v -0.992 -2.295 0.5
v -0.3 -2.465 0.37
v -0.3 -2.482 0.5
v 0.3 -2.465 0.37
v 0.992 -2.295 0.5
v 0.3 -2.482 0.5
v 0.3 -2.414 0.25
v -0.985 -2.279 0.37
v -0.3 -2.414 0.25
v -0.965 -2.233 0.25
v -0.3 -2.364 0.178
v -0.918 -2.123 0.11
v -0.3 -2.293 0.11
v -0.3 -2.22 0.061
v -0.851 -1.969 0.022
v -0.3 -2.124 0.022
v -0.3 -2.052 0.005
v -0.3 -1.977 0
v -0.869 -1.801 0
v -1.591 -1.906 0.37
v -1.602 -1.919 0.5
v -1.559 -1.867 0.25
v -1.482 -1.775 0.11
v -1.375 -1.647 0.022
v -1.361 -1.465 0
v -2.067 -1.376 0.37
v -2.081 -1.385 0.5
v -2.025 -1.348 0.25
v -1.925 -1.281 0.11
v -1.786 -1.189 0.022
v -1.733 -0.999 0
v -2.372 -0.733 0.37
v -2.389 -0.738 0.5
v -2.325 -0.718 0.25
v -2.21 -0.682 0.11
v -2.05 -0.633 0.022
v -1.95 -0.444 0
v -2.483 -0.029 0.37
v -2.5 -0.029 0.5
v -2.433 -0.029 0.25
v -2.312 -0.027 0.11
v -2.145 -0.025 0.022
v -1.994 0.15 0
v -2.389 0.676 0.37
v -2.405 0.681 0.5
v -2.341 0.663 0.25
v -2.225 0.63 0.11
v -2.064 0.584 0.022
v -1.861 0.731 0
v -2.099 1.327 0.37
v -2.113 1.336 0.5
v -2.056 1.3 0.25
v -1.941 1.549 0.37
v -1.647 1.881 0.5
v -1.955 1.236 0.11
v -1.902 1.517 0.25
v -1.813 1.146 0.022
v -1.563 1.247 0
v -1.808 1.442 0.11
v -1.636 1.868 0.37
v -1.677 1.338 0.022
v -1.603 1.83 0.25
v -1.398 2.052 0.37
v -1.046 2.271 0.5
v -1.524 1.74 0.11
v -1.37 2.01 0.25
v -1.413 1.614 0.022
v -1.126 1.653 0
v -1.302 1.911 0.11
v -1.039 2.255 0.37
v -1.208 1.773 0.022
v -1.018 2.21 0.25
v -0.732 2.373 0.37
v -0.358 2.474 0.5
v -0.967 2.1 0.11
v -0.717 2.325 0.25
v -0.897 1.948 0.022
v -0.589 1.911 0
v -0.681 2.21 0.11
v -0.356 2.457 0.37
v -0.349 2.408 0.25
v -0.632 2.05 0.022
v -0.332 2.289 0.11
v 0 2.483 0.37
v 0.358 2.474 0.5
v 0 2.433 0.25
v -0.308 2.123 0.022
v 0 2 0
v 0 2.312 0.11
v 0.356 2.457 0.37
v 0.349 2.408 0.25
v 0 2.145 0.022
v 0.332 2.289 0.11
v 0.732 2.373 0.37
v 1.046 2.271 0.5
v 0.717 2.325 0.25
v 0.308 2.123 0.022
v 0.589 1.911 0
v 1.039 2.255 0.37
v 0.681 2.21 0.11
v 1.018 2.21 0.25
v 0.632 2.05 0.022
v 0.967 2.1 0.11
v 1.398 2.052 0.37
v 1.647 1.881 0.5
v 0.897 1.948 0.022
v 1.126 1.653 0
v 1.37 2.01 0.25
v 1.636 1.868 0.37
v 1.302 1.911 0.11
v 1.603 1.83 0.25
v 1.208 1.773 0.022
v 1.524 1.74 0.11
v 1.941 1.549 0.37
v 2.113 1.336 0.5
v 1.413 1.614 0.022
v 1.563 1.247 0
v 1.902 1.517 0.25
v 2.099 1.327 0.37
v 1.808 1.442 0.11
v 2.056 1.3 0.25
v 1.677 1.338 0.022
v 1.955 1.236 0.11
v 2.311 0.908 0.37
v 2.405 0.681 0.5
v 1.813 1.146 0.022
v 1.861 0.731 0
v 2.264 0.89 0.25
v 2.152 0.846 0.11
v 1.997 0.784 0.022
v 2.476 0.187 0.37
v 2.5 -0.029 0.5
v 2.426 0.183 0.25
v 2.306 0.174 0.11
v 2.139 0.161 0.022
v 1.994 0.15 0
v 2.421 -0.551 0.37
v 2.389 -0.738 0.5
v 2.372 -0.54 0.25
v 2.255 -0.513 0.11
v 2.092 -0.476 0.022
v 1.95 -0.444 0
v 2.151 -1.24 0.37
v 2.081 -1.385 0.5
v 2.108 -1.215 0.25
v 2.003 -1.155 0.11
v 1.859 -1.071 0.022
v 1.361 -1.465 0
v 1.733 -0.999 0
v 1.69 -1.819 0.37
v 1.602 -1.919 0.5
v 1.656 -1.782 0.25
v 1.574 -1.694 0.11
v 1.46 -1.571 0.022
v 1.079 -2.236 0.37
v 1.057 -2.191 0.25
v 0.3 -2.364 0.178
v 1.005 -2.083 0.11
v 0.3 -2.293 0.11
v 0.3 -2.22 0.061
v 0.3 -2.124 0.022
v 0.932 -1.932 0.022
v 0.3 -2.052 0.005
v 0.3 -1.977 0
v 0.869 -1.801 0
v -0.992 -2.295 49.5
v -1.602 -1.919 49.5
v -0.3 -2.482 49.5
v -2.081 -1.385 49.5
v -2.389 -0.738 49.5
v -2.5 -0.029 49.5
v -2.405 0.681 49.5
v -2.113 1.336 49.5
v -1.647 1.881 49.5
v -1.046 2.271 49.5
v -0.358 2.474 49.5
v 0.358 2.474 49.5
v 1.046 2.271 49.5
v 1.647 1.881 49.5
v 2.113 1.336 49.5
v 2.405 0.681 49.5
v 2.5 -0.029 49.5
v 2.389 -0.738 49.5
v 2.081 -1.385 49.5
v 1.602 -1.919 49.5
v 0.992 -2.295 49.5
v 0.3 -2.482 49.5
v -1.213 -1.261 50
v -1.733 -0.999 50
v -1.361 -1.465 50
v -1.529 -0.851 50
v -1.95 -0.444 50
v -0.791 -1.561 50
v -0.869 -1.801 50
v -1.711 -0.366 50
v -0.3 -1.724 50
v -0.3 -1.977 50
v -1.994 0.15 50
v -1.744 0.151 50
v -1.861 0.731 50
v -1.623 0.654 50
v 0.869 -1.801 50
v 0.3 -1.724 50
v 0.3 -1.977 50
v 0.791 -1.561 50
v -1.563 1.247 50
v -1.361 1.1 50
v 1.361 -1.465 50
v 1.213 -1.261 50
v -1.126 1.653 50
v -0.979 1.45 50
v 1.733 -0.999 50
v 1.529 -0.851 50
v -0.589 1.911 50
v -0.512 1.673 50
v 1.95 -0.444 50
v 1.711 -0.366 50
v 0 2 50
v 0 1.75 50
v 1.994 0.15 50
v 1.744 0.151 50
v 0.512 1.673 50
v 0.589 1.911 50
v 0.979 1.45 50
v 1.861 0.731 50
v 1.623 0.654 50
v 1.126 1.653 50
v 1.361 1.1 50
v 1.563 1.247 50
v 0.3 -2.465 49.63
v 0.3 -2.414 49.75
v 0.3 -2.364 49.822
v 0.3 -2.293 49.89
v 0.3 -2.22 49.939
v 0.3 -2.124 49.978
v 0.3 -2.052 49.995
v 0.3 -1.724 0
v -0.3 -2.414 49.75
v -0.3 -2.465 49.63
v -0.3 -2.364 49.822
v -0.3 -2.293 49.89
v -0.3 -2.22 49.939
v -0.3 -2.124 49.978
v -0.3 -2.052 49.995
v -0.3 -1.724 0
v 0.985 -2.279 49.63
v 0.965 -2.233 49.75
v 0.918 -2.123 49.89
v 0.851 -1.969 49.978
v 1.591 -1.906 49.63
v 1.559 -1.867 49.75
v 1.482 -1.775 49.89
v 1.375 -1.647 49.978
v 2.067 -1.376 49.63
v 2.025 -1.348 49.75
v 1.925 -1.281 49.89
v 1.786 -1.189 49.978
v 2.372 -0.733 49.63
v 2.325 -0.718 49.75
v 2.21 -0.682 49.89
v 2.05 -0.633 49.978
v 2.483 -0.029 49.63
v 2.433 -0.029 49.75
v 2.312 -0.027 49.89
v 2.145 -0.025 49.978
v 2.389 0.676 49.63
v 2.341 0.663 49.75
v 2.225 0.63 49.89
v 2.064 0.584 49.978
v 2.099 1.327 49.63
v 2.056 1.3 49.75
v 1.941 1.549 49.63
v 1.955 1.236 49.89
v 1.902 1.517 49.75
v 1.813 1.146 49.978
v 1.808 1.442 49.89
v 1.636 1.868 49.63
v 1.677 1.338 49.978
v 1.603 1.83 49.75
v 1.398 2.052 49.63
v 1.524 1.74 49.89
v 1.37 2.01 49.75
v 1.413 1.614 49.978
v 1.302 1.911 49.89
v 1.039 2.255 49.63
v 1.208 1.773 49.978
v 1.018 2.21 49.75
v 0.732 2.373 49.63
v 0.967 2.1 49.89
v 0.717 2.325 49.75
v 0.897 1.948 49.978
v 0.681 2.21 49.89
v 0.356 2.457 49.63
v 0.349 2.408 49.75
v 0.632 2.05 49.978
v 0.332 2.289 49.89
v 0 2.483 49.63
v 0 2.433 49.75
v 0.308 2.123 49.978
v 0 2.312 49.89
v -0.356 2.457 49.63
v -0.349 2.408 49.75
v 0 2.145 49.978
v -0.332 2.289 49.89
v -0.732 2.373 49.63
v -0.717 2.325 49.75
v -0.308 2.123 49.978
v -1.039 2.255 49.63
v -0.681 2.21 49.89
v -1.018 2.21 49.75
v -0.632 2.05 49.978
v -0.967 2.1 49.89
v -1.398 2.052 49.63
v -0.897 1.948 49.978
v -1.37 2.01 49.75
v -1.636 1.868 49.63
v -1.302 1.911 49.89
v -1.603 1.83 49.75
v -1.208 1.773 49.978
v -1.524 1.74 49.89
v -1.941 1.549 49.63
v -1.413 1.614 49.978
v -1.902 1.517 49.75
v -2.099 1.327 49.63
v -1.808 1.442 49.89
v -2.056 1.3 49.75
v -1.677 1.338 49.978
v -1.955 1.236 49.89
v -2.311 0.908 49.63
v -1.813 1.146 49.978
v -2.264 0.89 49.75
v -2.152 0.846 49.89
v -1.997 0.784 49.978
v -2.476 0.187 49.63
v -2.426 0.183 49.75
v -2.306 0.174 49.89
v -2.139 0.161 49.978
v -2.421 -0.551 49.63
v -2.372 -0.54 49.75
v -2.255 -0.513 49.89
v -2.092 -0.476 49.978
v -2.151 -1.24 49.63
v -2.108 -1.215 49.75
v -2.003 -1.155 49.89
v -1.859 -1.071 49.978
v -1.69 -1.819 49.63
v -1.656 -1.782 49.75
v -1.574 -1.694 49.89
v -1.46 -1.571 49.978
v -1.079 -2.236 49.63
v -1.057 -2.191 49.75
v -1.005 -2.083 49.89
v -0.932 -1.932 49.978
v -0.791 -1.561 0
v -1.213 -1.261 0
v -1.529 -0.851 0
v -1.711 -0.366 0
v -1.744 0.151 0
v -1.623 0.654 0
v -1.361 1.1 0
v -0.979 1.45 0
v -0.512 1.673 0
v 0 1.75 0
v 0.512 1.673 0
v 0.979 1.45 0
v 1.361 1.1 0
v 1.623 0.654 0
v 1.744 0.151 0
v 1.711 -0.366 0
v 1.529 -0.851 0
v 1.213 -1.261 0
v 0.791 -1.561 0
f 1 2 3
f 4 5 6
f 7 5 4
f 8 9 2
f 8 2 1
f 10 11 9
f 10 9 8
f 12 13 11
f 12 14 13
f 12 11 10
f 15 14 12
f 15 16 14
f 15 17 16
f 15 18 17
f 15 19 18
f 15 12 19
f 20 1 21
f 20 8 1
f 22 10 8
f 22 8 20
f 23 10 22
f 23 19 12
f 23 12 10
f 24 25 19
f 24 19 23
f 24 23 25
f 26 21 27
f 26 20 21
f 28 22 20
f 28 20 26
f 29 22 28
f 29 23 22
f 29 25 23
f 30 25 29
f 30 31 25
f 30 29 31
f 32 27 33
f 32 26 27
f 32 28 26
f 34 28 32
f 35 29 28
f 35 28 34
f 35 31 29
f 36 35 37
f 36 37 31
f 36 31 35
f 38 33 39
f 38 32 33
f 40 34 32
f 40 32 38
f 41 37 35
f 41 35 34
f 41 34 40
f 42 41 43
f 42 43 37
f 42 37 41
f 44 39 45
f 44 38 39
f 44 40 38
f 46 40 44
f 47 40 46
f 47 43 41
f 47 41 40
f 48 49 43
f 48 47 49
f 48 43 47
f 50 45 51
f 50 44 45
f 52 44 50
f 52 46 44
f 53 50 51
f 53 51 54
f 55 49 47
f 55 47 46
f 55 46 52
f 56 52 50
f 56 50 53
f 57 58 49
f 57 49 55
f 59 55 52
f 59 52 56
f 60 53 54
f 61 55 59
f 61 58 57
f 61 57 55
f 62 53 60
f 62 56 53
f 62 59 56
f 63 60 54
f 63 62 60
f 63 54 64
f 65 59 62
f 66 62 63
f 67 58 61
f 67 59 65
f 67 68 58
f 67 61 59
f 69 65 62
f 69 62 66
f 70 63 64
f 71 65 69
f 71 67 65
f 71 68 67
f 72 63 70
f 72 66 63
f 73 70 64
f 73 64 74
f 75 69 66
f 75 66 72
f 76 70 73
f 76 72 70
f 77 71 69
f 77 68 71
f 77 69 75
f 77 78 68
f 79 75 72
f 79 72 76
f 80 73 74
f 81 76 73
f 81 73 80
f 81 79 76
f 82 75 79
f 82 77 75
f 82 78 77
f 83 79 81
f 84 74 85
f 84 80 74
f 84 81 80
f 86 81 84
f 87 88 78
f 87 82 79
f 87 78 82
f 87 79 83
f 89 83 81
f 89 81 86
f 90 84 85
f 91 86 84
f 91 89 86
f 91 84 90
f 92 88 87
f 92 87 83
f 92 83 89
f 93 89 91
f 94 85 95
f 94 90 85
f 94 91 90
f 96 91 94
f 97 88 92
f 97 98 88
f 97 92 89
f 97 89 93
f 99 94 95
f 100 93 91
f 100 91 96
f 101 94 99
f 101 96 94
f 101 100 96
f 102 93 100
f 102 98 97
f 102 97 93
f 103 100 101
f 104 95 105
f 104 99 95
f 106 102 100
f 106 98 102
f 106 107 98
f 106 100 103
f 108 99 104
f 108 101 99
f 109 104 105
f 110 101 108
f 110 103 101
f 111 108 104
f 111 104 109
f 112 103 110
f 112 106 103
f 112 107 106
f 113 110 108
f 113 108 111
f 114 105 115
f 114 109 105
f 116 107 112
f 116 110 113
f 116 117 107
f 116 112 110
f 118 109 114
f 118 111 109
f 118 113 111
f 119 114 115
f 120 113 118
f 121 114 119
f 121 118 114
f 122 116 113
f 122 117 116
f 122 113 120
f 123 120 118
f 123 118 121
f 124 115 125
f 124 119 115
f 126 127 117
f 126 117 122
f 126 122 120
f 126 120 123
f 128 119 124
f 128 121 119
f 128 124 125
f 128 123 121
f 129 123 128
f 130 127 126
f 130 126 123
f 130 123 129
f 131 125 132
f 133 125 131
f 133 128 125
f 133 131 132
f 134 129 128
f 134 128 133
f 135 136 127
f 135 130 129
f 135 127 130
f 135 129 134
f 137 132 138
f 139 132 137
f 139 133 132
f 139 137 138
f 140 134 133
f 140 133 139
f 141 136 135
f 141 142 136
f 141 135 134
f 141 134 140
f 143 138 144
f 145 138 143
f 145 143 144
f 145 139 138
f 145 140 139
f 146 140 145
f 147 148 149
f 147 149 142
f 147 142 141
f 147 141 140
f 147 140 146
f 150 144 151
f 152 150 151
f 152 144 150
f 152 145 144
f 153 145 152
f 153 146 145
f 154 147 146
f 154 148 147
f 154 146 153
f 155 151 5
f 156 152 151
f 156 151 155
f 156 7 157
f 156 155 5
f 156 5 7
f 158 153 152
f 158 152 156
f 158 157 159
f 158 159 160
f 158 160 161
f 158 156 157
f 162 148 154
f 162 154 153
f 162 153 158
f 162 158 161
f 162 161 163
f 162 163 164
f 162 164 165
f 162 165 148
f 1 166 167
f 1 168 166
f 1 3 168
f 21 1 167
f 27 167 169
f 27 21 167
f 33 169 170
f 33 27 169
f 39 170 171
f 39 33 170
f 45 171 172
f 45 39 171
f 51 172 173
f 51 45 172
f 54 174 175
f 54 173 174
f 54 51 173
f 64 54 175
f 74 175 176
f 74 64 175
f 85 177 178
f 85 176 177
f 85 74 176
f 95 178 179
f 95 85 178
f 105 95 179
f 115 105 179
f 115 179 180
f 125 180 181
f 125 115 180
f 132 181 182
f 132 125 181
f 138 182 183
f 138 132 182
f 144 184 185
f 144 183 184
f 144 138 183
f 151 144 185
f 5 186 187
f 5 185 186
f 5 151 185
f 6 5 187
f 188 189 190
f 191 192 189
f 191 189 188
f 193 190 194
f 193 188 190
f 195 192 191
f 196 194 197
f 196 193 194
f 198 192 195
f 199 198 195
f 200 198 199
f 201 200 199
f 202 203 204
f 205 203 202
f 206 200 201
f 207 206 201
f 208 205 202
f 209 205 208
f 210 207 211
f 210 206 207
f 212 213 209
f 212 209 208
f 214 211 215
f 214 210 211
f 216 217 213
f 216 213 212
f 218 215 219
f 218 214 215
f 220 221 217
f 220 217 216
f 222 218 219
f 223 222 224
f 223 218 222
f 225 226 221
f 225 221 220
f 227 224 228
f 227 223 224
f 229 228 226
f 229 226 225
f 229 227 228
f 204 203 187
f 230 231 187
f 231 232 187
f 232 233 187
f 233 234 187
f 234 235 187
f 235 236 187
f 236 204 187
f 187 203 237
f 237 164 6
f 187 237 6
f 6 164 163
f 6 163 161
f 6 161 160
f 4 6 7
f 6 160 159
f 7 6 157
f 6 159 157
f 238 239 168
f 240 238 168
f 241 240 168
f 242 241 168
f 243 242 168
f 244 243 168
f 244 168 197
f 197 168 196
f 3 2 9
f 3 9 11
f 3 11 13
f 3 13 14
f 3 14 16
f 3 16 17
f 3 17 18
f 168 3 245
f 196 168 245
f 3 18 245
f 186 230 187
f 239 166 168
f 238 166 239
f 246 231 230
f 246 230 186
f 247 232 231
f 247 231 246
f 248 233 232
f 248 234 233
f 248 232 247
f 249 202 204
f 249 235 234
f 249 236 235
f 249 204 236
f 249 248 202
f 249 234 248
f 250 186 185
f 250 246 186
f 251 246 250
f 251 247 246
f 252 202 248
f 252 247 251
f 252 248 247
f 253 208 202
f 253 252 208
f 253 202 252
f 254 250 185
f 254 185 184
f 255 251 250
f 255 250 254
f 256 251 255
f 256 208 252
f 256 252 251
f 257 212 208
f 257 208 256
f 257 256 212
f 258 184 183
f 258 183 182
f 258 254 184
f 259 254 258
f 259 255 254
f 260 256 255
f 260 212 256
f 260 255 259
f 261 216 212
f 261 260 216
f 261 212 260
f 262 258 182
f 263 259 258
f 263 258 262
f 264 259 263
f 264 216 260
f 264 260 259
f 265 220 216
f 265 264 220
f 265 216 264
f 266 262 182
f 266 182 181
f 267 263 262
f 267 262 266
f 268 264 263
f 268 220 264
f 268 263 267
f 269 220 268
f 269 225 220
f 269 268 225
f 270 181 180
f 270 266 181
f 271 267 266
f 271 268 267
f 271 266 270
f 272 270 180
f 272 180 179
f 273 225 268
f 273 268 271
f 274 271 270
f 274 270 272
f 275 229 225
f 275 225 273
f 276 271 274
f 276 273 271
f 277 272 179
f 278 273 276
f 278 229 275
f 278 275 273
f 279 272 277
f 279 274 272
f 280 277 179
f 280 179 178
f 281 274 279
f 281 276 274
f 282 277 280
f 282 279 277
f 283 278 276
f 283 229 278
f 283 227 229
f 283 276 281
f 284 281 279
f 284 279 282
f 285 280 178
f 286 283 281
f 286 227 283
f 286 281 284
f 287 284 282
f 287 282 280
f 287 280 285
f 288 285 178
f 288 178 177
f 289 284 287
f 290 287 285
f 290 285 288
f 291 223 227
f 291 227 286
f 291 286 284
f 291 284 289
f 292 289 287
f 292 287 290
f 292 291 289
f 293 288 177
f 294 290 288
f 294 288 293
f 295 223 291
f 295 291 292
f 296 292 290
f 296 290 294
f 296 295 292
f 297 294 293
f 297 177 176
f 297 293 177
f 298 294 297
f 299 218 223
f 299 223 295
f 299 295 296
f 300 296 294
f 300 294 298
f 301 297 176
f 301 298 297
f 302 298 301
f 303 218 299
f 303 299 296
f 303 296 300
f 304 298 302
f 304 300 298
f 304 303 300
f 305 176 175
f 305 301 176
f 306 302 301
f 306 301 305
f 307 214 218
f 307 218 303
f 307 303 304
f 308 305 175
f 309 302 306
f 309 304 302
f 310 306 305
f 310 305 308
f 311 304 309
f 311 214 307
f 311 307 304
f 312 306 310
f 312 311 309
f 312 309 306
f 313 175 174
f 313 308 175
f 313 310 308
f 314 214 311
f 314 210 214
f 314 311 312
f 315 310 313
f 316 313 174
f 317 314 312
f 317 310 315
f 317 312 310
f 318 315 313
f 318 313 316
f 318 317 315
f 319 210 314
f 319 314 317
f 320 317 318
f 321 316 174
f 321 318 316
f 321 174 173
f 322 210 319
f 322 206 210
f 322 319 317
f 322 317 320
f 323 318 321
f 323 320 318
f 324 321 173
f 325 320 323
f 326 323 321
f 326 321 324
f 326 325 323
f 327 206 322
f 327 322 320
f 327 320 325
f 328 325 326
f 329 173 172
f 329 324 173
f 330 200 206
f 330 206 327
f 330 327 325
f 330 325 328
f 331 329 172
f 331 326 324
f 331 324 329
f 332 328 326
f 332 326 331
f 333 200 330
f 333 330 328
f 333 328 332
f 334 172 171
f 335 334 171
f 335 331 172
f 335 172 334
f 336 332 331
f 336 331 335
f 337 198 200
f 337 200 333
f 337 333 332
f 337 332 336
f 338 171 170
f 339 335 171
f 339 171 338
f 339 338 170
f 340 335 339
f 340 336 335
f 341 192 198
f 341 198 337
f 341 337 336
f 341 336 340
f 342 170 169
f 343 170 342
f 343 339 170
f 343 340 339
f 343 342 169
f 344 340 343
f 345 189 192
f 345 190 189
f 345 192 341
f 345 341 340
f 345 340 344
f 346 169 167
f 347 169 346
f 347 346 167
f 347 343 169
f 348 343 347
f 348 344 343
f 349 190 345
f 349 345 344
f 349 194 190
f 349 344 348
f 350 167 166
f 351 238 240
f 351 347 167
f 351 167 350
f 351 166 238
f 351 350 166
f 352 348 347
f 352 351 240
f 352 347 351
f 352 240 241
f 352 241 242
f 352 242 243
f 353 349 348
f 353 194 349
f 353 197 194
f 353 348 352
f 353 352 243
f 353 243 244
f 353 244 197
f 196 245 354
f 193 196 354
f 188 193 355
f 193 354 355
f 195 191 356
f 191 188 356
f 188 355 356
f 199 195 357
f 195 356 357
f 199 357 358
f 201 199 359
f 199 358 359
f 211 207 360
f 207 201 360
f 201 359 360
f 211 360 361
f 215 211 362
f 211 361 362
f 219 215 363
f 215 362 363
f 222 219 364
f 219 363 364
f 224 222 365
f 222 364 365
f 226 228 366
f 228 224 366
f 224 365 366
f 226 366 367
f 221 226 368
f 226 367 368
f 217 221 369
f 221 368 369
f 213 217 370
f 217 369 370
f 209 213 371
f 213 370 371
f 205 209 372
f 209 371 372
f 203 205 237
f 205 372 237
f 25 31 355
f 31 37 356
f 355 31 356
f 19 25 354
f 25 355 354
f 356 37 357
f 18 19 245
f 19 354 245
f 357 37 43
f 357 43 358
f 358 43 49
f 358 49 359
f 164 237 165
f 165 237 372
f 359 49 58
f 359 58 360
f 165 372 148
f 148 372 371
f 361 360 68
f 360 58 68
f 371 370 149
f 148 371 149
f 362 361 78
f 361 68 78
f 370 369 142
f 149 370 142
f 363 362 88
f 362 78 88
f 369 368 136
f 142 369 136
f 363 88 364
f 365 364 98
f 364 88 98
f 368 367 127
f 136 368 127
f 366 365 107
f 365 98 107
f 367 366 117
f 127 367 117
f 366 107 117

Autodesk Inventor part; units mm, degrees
ref_plane "YZ Plane" through (0, 0, 0) normal (1, 0, 0) x (0, 1, 0)
ref_plane "XZ Plane" through (0, 0, 0) normal (0, 1, 0) x (-1, 0, 0)
ref_plane "XY Plane" through (0, 0, 0) normal (0, 0, 1) x (1, 0, 0)
sketch "草圖1" plane through (0, 0, 0) normal (0, 0, 1) x (1, 0, 0)
  arc A0 (0.3, -2.4819) -> (-0.3, -2.4819) centre (0, 0) ccw
  arc A1 (0.3, -1.7241) -> (-0.3, -1.7241) centre (0, 0) ccw
  line L0 (0.3, -1.7241) -> (0.3, -2.4819)
  line L1 (-0.3, -2.4819) -> (-0.3, -1.7241)
  dimension "d0" = 5
  dimension "d1" = 3.5
  dimension "d2" = 0.3
  dimension "d3" = 0.6
extrude "擠出1" add sketch "草圖1" along normal blind 50
fillet "圓角1" radius 0.5 2 edges at (0, 2.5, 50) (0, 2.5, 0)
properties part number "5x65彈簧銷"
